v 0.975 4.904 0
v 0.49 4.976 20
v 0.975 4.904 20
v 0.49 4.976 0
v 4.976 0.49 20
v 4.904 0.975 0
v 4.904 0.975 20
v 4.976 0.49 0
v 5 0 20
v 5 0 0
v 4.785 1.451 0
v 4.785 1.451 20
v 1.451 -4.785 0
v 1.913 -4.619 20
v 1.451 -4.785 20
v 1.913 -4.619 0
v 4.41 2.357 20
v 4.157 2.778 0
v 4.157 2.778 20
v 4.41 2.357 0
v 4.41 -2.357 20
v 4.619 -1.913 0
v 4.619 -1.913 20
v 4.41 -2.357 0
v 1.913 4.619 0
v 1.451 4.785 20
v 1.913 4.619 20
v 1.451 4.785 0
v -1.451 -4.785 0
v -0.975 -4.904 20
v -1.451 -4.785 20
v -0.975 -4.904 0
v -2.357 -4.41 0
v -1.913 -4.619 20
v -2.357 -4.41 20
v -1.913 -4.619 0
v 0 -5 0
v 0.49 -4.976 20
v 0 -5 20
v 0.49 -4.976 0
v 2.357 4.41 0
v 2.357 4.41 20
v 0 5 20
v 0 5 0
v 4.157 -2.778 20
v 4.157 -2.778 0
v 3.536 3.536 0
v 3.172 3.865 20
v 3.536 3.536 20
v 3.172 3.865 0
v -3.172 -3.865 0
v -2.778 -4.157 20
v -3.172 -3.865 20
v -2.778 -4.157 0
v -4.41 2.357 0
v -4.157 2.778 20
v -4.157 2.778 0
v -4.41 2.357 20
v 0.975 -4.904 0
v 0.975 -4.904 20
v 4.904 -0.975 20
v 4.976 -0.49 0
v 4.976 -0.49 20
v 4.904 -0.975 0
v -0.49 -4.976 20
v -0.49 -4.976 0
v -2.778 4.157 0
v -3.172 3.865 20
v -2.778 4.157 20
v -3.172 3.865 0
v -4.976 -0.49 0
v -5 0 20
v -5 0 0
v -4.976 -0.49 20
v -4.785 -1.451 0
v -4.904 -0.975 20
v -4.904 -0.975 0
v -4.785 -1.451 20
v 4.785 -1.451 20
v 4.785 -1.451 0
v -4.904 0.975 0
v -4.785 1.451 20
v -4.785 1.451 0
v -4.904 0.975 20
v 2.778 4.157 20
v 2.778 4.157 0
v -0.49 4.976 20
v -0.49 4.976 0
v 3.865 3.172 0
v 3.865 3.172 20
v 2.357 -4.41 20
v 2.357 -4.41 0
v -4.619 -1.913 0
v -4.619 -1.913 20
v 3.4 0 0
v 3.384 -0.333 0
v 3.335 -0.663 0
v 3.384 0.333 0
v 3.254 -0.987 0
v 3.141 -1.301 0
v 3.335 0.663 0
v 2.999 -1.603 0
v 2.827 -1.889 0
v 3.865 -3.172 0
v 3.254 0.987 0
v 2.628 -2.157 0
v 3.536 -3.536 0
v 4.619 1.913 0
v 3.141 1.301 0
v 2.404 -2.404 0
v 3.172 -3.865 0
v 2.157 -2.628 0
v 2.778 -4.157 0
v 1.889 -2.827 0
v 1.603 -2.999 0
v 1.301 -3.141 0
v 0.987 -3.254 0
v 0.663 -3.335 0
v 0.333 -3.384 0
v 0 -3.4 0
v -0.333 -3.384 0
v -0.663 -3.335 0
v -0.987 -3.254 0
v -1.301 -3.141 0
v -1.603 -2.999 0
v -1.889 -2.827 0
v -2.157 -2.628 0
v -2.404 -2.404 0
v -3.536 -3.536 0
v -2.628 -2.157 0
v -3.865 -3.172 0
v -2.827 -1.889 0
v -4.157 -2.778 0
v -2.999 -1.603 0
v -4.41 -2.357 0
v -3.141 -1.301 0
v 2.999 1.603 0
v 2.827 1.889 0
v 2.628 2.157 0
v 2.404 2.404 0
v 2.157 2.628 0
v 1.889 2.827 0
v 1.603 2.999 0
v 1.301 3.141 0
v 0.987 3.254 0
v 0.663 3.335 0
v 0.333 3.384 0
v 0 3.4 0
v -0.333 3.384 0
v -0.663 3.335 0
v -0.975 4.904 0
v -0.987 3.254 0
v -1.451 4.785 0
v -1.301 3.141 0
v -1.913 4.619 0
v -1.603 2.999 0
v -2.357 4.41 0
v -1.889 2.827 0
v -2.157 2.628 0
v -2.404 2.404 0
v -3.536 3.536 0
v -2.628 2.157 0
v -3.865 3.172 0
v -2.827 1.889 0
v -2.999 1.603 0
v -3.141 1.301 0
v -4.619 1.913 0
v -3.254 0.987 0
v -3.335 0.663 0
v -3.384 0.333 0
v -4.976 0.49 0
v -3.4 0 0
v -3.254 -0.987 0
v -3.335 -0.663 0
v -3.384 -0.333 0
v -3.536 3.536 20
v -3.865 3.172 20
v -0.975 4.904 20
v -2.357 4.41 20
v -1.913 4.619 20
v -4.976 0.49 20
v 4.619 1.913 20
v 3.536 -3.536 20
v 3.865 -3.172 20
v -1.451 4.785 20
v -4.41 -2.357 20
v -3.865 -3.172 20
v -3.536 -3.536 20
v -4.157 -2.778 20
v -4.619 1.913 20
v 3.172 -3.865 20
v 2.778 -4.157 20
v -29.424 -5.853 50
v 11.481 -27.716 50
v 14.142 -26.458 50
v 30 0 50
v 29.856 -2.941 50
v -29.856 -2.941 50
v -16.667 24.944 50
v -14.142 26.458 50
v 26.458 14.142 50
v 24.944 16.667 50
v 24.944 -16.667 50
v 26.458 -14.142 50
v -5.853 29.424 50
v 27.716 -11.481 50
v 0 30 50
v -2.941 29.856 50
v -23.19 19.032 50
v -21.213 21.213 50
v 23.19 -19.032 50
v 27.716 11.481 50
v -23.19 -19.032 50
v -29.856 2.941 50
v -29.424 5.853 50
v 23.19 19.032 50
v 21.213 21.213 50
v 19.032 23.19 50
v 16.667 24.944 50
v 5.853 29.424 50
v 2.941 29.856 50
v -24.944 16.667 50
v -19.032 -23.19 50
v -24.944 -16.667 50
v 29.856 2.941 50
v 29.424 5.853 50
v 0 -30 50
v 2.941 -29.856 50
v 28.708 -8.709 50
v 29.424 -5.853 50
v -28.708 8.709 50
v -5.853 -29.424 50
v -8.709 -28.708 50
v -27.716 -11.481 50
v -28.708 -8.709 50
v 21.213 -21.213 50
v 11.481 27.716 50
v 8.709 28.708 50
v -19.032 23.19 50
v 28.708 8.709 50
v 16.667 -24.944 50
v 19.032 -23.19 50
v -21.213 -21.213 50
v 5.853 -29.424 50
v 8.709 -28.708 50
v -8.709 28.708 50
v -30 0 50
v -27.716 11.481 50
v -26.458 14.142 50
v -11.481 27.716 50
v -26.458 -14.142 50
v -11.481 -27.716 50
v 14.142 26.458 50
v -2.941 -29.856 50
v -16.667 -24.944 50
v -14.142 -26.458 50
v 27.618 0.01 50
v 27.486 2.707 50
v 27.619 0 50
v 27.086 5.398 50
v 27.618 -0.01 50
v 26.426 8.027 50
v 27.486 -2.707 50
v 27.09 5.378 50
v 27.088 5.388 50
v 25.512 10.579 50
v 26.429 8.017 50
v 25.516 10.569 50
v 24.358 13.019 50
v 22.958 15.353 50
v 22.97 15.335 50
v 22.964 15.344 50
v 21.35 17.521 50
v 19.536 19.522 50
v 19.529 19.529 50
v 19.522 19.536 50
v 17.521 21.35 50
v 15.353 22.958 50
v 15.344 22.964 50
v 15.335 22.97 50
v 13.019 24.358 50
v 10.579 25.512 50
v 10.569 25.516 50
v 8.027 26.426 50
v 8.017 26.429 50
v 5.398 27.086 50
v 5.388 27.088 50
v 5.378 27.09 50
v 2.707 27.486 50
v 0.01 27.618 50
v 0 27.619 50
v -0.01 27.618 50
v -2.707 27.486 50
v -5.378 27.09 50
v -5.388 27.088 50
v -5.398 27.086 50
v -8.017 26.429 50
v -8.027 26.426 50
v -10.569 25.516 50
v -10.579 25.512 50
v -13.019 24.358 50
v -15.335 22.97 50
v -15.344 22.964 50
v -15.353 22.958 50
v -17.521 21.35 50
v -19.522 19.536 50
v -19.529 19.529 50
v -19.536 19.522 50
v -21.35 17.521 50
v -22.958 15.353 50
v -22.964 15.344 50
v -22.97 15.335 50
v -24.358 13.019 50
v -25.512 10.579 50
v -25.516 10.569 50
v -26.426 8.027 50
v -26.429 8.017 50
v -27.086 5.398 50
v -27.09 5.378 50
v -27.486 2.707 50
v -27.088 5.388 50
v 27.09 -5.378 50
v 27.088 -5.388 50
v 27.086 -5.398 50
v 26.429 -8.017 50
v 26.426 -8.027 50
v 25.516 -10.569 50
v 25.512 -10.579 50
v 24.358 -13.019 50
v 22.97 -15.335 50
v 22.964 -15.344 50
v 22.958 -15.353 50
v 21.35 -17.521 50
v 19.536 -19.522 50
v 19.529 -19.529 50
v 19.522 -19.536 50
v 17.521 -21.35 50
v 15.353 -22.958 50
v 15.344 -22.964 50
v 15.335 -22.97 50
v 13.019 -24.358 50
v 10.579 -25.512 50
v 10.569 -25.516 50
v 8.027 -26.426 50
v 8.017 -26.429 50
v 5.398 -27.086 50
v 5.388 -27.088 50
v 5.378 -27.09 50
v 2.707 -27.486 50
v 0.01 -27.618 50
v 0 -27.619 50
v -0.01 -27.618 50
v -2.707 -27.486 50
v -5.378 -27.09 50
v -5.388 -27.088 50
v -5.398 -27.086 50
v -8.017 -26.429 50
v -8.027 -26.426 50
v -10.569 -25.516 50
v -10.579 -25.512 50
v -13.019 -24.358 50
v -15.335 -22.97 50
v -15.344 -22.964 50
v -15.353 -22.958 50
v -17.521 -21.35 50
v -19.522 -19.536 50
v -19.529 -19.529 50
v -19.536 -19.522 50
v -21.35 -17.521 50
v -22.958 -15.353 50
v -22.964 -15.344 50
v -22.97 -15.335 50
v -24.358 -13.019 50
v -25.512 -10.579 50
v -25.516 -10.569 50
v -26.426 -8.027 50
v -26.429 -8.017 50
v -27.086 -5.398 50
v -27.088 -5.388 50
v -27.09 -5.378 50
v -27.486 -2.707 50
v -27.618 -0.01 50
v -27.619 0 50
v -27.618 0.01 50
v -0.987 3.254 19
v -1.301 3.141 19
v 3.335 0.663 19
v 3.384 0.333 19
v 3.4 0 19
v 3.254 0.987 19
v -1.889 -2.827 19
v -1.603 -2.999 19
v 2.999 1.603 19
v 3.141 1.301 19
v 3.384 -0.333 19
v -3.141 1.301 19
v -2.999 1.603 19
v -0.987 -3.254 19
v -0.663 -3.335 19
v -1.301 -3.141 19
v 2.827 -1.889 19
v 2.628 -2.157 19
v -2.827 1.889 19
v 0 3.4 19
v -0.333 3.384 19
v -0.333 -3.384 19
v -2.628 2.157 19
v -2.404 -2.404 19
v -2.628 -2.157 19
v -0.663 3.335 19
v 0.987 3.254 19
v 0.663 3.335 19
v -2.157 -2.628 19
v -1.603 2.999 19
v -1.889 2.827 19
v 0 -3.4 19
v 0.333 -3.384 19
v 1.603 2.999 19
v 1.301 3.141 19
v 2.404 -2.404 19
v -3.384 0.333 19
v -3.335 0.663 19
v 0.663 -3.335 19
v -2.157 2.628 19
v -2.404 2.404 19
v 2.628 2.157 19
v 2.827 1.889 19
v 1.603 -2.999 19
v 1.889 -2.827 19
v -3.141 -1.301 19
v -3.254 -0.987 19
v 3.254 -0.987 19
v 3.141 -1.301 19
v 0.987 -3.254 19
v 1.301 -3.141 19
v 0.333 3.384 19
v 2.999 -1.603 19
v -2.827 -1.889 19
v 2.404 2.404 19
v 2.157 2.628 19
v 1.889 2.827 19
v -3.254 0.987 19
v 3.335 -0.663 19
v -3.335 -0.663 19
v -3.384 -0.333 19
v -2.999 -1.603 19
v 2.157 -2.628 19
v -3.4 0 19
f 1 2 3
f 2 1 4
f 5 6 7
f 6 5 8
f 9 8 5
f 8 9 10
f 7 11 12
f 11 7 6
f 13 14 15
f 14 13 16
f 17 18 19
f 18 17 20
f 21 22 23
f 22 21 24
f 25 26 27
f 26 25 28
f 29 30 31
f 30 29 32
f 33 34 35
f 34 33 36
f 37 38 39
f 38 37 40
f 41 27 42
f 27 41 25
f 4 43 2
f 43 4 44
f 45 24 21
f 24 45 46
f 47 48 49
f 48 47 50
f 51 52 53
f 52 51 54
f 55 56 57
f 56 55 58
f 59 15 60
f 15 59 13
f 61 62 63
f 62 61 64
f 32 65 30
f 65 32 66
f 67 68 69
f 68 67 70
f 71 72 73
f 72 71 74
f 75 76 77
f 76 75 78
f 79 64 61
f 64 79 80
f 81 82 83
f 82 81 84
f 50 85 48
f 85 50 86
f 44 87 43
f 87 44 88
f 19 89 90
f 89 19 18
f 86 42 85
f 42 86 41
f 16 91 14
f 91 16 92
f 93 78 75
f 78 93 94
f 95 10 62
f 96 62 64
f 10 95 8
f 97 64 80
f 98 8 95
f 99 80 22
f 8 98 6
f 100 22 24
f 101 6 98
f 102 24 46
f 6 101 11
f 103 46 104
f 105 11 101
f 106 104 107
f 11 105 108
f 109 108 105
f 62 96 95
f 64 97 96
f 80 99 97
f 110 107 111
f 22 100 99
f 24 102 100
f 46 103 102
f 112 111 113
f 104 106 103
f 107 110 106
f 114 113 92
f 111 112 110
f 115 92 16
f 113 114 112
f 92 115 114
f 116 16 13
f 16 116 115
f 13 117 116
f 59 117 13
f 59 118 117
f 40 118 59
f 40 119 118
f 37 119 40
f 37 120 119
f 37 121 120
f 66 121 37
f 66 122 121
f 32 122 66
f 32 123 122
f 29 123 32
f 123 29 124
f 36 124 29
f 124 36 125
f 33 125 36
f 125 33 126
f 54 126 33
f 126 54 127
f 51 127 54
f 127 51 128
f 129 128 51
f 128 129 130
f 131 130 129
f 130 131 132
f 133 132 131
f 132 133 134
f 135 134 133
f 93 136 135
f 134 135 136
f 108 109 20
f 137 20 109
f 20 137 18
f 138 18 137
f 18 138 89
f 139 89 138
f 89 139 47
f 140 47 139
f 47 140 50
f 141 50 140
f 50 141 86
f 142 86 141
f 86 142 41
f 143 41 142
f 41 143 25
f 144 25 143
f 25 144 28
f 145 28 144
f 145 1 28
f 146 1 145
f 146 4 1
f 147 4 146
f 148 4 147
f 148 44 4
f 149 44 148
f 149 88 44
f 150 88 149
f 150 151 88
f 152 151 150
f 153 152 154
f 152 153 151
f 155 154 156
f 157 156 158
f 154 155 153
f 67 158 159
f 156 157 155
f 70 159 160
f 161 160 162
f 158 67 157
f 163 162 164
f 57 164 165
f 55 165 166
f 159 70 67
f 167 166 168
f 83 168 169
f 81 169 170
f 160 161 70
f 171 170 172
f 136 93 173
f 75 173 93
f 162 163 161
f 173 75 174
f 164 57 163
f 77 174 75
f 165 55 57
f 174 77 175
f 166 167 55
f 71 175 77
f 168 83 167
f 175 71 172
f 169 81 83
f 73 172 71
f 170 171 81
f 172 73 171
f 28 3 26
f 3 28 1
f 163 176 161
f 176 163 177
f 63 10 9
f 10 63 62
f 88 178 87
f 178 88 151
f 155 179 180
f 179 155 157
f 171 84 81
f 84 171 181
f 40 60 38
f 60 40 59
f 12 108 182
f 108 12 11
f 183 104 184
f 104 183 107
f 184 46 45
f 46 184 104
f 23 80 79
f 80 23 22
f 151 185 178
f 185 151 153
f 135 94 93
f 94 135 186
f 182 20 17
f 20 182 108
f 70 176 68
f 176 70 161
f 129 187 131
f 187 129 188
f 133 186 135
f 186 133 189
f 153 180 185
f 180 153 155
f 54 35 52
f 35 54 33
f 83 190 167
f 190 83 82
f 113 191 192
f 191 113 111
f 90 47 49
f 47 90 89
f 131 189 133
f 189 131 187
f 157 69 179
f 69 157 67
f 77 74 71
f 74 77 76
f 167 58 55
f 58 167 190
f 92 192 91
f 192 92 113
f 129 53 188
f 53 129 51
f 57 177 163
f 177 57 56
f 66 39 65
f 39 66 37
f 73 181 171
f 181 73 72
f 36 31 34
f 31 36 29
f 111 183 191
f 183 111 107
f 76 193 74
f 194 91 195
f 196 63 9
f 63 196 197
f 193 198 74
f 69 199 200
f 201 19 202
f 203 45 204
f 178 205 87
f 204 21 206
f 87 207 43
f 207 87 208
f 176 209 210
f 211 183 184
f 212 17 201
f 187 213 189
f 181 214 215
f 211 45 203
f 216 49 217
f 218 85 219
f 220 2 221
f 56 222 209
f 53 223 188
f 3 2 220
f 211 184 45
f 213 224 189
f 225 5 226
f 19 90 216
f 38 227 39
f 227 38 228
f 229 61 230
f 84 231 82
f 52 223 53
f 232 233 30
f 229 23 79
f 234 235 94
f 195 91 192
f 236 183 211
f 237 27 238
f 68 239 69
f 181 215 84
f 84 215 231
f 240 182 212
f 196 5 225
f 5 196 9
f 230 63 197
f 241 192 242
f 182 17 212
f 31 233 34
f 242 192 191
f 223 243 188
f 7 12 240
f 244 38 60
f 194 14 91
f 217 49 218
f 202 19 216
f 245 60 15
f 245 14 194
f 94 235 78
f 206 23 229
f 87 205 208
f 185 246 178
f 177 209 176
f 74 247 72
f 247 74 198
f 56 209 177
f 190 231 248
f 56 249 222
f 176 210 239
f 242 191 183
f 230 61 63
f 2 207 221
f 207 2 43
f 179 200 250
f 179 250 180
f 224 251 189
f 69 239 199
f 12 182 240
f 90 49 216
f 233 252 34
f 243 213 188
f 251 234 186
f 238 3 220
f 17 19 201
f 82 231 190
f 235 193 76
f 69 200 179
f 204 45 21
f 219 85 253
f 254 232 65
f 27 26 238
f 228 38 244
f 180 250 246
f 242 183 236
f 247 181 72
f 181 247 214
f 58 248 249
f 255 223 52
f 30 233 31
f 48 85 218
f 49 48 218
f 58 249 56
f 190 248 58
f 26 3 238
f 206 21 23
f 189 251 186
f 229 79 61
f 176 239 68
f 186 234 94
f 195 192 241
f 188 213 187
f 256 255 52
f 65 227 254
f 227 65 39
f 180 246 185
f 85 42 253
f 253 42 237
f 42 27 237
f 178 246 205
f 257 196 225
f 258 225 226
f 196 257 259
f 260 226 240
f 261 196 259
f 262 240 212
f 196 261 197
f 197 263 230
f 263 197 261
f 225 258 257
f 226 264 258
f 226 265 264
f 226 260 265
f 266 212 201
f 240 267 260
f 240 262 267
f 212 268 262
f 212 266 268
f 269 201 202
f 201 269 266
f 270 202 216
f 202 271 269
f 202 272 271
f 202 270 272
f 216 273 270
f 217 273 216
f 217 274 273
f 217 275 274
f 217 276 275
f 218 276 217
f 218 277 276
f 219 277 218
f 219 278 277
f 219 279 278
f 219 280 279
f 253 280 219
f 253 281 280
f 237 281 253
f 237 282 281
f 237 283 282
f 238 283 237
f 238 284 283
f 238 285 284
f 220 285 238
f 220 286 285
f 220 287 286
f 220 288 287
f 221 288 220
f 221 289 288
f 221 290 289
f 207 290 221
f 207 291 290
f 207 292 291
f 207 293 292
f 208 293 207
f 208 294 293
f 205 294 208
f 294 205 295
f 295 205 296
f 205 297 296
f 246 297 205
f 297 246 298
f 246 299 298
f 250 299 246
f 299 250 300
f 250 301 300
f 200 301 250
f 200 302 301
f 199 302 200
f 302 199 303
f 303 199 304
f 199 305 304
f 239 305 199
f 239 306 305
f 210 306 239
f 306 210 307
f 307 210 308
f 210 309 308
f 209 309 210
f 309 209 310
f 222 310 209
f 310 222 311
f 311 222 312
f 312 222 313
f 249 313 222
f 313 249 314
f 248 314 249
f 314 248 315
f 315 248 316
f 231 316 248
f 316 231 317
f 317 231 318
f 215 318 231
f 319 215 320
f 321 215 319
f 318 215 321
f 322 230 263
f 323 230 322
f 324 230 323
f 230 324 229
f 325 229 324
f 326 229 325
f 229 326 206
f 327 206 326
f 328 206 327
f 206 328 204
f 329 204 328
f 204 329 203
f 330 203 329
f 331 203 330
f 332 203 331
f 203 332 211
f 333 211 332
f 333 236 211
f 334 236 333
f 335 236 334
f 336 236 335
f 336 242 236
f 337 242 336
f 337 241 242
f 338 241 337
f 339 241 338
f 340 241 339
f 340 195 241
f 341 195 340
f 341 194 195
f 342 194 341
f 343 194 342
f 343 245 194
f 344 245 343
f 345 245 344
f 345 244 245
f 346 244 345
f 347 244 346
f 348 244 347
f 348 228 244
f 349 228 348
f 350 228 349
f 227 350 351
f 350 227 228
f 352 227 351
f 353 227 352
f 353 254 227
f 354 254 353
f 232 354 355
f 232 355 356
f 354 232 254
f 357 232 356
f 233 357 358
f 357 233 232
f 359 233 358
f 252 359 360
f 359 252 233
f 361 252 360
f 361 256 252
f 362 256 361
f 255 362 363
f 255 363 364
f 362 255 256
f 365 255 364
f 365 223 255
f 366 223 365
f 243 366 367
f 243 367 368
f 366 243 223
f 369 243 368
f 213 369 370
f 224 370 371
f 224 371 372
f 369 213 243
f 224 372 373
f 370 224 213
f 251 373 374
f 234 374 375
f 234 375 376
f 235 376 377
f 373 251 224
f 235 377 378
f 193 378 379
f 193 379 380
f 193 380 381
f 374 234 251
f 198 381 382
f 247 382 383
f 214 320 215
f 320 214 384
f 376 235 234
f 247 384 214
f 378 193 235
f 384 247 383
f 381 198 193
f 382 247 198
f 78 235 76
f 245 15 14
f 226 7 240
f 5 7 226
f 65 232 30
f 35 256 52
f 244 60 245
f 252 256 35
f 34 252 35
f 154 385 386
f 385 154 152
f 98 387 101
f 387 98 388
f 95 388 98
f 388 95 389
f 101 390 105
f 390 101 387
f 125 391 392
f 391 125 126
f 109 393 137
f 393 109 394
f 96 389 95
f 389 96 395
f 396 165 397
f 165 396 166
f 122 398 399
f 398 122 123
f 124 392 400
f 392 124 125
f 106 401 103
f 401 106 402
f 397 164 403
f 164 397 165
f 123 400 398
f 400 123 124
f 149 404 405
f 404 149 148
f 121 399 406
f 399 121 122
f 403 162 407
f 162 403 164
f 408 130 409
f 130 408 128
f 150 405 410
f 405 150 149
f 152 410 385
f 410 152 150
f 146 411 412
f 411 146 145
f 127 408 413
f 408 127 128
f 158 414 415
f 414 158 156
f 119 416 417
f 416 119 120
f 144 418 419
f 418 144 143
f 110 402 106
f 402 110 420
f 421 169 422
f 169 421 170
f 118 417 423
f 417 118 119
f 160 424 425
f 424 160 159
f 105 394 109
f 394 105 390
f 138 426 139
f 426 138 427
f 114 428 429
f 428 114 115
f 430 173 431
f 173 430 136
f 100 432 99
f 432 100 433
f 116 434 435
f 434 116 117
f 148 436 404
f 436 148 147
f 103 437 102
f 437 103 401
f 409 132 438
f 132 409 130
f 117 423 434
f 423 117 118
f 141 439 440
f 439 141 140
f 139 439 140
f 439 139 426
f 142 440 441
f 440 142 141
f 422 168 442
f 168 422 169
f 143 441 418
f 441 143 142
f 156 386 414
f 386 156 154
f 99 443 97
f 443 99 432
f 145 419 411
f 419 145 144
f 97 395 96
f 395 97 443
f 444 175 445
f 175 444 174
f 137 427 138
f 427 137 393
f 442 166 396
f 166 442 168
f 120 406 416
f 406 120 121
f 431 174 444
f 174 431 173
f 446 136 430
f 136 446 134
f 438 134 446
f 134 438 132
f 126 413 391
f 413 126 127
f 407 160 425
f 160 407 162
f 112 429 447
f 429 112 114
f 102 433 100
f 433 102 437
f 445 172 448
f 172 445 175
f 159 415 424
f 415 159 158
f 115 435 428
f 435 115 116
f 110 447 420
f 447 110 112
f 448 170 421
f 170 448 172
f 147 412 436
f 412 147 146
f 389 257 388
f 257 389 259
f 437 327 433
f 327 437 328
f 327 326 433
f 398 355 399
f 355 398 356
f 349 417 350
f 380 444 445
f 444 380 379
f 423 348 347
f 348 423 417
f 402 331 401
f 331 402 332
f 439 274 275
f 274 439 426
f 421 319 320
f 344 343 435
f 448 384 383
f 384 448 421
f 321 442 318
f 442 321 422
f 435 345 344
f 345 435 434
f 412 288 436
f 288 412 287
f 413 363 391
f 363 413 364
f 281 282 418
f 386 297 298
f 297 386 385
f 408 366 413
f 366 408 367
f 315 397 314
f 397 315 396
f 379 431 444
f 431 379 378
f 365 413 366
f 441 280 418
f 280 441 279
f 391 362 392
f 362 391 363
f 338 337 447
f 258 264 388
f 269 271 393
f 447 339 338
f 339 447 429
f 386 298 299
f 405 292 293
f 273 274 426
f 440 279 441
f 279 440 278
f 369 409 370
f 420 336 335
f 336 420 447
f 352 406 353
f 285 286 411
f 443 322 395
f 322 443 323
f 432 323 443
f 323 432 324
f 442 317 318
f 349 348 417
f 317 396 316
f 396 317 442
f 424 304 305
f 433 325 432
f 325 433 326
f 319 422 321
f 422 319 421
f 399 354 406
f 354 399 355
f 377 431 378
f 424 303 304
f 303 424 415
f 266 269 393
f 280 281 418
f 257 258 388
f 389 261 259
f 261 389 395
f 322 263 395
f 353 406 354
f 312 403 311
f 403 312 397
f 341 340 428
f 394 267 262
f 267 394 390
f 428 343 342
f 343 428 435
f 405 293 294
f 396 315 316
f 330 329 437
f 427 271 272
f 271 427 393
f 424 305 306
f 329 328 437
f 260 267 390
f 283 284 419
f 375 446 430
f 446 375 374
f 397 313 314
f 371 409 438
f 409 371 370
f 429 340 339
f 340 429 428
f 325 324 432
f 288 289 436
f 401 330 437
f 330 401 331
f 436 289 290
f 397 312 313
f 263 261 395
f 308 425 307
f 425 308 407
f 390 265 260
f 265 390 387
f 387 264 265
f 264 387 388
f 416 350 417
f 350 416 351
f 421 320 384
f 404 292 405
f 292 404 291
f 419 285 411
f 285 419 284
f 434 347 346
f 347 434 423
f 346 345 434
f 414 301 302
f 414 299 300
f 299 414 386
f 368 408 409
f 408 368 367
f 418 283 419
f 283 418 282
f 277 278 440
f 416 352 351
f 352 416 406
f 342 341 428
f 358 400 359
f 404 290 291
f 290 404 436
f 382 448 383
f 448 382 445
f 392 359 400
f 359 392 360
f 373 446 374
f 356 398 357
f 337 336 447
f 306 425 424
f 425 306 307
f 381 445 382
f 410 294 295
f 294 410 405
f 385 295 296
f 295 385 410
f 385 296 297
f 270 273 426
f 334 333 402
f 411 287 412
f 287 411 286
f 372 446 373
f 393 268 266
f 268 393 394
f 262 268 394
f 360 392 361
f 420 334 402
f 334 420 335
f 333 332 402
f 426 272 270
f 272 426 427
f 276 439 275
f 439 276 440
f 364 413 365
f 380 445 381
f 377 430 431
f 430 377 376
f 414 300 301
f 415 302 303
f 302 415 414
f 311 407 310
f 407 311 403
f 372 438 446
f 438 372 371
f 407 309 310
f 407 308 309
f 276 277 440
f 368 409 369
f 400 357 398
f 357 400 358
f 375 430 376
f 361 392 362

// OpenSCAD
// Small lab funnel – printed upright, wide opening at top.
// All dimensions in mm, taken directly from the spec.

$fn = 64;

// ---- Named dimensions (measured with calipers) ----
spout_od   = 10;   // spout outer diameter
spout_h    = 20;   // spout height (z = 0 .. 20)
cone_od    = 60;   // cone outer diameter at the rim (z = 50)
cone_h     = 30;   // cone height (z = 20 .. 50)
wall       = 1.6;  // uniform wall thickness

// Derived values
spout_id   = spout_od - 2 * wall;   // 6.8 mm spout bore
cone_id    = cone_od  - 2 * wall;   // 56.8 mm inner rim diameter

// ---- Outer solid (spout cylinder + cone) ----
module outer() { union() {
    // Straight spout, z = 0 .. 20
    cylinder(h = spout_h, d = spout_od, center = false);
    // Cone, z = 20 .. 50 (10 mm OD at base -> 60 mm OD at rim)
    translate([0, 0, spout_h])
        cylinder(h = cone_h, d1 = spout_od, d2 = cone_od, center = false);
} }

// ---- Inner cavity (spout bore + cone bore), open at both ends ----
// Each cutter is extended 1 mm past the faces it cuts (no coplanar faces).
module inner() { union() {
    // Spout bore, extended 1 mm below z = 0 and 1 mm above z = 20
    cylinder(h = spout_h + 2, d = spout_id, center = false,
             translate = [0, 0, -1]);
    // Cone bore, extended 1 mm below z = 20 and 1 mm above z = 50
    translate([0, 0, spout_h - 1])
        cylinder(h = cone_h + 2, d1 = spout_id, d2 = cone_id, center = false);
} }

// ---- Funnel = outer minus inner (open top and bottom) ----
difference() {
    outer();
    inner();
}
